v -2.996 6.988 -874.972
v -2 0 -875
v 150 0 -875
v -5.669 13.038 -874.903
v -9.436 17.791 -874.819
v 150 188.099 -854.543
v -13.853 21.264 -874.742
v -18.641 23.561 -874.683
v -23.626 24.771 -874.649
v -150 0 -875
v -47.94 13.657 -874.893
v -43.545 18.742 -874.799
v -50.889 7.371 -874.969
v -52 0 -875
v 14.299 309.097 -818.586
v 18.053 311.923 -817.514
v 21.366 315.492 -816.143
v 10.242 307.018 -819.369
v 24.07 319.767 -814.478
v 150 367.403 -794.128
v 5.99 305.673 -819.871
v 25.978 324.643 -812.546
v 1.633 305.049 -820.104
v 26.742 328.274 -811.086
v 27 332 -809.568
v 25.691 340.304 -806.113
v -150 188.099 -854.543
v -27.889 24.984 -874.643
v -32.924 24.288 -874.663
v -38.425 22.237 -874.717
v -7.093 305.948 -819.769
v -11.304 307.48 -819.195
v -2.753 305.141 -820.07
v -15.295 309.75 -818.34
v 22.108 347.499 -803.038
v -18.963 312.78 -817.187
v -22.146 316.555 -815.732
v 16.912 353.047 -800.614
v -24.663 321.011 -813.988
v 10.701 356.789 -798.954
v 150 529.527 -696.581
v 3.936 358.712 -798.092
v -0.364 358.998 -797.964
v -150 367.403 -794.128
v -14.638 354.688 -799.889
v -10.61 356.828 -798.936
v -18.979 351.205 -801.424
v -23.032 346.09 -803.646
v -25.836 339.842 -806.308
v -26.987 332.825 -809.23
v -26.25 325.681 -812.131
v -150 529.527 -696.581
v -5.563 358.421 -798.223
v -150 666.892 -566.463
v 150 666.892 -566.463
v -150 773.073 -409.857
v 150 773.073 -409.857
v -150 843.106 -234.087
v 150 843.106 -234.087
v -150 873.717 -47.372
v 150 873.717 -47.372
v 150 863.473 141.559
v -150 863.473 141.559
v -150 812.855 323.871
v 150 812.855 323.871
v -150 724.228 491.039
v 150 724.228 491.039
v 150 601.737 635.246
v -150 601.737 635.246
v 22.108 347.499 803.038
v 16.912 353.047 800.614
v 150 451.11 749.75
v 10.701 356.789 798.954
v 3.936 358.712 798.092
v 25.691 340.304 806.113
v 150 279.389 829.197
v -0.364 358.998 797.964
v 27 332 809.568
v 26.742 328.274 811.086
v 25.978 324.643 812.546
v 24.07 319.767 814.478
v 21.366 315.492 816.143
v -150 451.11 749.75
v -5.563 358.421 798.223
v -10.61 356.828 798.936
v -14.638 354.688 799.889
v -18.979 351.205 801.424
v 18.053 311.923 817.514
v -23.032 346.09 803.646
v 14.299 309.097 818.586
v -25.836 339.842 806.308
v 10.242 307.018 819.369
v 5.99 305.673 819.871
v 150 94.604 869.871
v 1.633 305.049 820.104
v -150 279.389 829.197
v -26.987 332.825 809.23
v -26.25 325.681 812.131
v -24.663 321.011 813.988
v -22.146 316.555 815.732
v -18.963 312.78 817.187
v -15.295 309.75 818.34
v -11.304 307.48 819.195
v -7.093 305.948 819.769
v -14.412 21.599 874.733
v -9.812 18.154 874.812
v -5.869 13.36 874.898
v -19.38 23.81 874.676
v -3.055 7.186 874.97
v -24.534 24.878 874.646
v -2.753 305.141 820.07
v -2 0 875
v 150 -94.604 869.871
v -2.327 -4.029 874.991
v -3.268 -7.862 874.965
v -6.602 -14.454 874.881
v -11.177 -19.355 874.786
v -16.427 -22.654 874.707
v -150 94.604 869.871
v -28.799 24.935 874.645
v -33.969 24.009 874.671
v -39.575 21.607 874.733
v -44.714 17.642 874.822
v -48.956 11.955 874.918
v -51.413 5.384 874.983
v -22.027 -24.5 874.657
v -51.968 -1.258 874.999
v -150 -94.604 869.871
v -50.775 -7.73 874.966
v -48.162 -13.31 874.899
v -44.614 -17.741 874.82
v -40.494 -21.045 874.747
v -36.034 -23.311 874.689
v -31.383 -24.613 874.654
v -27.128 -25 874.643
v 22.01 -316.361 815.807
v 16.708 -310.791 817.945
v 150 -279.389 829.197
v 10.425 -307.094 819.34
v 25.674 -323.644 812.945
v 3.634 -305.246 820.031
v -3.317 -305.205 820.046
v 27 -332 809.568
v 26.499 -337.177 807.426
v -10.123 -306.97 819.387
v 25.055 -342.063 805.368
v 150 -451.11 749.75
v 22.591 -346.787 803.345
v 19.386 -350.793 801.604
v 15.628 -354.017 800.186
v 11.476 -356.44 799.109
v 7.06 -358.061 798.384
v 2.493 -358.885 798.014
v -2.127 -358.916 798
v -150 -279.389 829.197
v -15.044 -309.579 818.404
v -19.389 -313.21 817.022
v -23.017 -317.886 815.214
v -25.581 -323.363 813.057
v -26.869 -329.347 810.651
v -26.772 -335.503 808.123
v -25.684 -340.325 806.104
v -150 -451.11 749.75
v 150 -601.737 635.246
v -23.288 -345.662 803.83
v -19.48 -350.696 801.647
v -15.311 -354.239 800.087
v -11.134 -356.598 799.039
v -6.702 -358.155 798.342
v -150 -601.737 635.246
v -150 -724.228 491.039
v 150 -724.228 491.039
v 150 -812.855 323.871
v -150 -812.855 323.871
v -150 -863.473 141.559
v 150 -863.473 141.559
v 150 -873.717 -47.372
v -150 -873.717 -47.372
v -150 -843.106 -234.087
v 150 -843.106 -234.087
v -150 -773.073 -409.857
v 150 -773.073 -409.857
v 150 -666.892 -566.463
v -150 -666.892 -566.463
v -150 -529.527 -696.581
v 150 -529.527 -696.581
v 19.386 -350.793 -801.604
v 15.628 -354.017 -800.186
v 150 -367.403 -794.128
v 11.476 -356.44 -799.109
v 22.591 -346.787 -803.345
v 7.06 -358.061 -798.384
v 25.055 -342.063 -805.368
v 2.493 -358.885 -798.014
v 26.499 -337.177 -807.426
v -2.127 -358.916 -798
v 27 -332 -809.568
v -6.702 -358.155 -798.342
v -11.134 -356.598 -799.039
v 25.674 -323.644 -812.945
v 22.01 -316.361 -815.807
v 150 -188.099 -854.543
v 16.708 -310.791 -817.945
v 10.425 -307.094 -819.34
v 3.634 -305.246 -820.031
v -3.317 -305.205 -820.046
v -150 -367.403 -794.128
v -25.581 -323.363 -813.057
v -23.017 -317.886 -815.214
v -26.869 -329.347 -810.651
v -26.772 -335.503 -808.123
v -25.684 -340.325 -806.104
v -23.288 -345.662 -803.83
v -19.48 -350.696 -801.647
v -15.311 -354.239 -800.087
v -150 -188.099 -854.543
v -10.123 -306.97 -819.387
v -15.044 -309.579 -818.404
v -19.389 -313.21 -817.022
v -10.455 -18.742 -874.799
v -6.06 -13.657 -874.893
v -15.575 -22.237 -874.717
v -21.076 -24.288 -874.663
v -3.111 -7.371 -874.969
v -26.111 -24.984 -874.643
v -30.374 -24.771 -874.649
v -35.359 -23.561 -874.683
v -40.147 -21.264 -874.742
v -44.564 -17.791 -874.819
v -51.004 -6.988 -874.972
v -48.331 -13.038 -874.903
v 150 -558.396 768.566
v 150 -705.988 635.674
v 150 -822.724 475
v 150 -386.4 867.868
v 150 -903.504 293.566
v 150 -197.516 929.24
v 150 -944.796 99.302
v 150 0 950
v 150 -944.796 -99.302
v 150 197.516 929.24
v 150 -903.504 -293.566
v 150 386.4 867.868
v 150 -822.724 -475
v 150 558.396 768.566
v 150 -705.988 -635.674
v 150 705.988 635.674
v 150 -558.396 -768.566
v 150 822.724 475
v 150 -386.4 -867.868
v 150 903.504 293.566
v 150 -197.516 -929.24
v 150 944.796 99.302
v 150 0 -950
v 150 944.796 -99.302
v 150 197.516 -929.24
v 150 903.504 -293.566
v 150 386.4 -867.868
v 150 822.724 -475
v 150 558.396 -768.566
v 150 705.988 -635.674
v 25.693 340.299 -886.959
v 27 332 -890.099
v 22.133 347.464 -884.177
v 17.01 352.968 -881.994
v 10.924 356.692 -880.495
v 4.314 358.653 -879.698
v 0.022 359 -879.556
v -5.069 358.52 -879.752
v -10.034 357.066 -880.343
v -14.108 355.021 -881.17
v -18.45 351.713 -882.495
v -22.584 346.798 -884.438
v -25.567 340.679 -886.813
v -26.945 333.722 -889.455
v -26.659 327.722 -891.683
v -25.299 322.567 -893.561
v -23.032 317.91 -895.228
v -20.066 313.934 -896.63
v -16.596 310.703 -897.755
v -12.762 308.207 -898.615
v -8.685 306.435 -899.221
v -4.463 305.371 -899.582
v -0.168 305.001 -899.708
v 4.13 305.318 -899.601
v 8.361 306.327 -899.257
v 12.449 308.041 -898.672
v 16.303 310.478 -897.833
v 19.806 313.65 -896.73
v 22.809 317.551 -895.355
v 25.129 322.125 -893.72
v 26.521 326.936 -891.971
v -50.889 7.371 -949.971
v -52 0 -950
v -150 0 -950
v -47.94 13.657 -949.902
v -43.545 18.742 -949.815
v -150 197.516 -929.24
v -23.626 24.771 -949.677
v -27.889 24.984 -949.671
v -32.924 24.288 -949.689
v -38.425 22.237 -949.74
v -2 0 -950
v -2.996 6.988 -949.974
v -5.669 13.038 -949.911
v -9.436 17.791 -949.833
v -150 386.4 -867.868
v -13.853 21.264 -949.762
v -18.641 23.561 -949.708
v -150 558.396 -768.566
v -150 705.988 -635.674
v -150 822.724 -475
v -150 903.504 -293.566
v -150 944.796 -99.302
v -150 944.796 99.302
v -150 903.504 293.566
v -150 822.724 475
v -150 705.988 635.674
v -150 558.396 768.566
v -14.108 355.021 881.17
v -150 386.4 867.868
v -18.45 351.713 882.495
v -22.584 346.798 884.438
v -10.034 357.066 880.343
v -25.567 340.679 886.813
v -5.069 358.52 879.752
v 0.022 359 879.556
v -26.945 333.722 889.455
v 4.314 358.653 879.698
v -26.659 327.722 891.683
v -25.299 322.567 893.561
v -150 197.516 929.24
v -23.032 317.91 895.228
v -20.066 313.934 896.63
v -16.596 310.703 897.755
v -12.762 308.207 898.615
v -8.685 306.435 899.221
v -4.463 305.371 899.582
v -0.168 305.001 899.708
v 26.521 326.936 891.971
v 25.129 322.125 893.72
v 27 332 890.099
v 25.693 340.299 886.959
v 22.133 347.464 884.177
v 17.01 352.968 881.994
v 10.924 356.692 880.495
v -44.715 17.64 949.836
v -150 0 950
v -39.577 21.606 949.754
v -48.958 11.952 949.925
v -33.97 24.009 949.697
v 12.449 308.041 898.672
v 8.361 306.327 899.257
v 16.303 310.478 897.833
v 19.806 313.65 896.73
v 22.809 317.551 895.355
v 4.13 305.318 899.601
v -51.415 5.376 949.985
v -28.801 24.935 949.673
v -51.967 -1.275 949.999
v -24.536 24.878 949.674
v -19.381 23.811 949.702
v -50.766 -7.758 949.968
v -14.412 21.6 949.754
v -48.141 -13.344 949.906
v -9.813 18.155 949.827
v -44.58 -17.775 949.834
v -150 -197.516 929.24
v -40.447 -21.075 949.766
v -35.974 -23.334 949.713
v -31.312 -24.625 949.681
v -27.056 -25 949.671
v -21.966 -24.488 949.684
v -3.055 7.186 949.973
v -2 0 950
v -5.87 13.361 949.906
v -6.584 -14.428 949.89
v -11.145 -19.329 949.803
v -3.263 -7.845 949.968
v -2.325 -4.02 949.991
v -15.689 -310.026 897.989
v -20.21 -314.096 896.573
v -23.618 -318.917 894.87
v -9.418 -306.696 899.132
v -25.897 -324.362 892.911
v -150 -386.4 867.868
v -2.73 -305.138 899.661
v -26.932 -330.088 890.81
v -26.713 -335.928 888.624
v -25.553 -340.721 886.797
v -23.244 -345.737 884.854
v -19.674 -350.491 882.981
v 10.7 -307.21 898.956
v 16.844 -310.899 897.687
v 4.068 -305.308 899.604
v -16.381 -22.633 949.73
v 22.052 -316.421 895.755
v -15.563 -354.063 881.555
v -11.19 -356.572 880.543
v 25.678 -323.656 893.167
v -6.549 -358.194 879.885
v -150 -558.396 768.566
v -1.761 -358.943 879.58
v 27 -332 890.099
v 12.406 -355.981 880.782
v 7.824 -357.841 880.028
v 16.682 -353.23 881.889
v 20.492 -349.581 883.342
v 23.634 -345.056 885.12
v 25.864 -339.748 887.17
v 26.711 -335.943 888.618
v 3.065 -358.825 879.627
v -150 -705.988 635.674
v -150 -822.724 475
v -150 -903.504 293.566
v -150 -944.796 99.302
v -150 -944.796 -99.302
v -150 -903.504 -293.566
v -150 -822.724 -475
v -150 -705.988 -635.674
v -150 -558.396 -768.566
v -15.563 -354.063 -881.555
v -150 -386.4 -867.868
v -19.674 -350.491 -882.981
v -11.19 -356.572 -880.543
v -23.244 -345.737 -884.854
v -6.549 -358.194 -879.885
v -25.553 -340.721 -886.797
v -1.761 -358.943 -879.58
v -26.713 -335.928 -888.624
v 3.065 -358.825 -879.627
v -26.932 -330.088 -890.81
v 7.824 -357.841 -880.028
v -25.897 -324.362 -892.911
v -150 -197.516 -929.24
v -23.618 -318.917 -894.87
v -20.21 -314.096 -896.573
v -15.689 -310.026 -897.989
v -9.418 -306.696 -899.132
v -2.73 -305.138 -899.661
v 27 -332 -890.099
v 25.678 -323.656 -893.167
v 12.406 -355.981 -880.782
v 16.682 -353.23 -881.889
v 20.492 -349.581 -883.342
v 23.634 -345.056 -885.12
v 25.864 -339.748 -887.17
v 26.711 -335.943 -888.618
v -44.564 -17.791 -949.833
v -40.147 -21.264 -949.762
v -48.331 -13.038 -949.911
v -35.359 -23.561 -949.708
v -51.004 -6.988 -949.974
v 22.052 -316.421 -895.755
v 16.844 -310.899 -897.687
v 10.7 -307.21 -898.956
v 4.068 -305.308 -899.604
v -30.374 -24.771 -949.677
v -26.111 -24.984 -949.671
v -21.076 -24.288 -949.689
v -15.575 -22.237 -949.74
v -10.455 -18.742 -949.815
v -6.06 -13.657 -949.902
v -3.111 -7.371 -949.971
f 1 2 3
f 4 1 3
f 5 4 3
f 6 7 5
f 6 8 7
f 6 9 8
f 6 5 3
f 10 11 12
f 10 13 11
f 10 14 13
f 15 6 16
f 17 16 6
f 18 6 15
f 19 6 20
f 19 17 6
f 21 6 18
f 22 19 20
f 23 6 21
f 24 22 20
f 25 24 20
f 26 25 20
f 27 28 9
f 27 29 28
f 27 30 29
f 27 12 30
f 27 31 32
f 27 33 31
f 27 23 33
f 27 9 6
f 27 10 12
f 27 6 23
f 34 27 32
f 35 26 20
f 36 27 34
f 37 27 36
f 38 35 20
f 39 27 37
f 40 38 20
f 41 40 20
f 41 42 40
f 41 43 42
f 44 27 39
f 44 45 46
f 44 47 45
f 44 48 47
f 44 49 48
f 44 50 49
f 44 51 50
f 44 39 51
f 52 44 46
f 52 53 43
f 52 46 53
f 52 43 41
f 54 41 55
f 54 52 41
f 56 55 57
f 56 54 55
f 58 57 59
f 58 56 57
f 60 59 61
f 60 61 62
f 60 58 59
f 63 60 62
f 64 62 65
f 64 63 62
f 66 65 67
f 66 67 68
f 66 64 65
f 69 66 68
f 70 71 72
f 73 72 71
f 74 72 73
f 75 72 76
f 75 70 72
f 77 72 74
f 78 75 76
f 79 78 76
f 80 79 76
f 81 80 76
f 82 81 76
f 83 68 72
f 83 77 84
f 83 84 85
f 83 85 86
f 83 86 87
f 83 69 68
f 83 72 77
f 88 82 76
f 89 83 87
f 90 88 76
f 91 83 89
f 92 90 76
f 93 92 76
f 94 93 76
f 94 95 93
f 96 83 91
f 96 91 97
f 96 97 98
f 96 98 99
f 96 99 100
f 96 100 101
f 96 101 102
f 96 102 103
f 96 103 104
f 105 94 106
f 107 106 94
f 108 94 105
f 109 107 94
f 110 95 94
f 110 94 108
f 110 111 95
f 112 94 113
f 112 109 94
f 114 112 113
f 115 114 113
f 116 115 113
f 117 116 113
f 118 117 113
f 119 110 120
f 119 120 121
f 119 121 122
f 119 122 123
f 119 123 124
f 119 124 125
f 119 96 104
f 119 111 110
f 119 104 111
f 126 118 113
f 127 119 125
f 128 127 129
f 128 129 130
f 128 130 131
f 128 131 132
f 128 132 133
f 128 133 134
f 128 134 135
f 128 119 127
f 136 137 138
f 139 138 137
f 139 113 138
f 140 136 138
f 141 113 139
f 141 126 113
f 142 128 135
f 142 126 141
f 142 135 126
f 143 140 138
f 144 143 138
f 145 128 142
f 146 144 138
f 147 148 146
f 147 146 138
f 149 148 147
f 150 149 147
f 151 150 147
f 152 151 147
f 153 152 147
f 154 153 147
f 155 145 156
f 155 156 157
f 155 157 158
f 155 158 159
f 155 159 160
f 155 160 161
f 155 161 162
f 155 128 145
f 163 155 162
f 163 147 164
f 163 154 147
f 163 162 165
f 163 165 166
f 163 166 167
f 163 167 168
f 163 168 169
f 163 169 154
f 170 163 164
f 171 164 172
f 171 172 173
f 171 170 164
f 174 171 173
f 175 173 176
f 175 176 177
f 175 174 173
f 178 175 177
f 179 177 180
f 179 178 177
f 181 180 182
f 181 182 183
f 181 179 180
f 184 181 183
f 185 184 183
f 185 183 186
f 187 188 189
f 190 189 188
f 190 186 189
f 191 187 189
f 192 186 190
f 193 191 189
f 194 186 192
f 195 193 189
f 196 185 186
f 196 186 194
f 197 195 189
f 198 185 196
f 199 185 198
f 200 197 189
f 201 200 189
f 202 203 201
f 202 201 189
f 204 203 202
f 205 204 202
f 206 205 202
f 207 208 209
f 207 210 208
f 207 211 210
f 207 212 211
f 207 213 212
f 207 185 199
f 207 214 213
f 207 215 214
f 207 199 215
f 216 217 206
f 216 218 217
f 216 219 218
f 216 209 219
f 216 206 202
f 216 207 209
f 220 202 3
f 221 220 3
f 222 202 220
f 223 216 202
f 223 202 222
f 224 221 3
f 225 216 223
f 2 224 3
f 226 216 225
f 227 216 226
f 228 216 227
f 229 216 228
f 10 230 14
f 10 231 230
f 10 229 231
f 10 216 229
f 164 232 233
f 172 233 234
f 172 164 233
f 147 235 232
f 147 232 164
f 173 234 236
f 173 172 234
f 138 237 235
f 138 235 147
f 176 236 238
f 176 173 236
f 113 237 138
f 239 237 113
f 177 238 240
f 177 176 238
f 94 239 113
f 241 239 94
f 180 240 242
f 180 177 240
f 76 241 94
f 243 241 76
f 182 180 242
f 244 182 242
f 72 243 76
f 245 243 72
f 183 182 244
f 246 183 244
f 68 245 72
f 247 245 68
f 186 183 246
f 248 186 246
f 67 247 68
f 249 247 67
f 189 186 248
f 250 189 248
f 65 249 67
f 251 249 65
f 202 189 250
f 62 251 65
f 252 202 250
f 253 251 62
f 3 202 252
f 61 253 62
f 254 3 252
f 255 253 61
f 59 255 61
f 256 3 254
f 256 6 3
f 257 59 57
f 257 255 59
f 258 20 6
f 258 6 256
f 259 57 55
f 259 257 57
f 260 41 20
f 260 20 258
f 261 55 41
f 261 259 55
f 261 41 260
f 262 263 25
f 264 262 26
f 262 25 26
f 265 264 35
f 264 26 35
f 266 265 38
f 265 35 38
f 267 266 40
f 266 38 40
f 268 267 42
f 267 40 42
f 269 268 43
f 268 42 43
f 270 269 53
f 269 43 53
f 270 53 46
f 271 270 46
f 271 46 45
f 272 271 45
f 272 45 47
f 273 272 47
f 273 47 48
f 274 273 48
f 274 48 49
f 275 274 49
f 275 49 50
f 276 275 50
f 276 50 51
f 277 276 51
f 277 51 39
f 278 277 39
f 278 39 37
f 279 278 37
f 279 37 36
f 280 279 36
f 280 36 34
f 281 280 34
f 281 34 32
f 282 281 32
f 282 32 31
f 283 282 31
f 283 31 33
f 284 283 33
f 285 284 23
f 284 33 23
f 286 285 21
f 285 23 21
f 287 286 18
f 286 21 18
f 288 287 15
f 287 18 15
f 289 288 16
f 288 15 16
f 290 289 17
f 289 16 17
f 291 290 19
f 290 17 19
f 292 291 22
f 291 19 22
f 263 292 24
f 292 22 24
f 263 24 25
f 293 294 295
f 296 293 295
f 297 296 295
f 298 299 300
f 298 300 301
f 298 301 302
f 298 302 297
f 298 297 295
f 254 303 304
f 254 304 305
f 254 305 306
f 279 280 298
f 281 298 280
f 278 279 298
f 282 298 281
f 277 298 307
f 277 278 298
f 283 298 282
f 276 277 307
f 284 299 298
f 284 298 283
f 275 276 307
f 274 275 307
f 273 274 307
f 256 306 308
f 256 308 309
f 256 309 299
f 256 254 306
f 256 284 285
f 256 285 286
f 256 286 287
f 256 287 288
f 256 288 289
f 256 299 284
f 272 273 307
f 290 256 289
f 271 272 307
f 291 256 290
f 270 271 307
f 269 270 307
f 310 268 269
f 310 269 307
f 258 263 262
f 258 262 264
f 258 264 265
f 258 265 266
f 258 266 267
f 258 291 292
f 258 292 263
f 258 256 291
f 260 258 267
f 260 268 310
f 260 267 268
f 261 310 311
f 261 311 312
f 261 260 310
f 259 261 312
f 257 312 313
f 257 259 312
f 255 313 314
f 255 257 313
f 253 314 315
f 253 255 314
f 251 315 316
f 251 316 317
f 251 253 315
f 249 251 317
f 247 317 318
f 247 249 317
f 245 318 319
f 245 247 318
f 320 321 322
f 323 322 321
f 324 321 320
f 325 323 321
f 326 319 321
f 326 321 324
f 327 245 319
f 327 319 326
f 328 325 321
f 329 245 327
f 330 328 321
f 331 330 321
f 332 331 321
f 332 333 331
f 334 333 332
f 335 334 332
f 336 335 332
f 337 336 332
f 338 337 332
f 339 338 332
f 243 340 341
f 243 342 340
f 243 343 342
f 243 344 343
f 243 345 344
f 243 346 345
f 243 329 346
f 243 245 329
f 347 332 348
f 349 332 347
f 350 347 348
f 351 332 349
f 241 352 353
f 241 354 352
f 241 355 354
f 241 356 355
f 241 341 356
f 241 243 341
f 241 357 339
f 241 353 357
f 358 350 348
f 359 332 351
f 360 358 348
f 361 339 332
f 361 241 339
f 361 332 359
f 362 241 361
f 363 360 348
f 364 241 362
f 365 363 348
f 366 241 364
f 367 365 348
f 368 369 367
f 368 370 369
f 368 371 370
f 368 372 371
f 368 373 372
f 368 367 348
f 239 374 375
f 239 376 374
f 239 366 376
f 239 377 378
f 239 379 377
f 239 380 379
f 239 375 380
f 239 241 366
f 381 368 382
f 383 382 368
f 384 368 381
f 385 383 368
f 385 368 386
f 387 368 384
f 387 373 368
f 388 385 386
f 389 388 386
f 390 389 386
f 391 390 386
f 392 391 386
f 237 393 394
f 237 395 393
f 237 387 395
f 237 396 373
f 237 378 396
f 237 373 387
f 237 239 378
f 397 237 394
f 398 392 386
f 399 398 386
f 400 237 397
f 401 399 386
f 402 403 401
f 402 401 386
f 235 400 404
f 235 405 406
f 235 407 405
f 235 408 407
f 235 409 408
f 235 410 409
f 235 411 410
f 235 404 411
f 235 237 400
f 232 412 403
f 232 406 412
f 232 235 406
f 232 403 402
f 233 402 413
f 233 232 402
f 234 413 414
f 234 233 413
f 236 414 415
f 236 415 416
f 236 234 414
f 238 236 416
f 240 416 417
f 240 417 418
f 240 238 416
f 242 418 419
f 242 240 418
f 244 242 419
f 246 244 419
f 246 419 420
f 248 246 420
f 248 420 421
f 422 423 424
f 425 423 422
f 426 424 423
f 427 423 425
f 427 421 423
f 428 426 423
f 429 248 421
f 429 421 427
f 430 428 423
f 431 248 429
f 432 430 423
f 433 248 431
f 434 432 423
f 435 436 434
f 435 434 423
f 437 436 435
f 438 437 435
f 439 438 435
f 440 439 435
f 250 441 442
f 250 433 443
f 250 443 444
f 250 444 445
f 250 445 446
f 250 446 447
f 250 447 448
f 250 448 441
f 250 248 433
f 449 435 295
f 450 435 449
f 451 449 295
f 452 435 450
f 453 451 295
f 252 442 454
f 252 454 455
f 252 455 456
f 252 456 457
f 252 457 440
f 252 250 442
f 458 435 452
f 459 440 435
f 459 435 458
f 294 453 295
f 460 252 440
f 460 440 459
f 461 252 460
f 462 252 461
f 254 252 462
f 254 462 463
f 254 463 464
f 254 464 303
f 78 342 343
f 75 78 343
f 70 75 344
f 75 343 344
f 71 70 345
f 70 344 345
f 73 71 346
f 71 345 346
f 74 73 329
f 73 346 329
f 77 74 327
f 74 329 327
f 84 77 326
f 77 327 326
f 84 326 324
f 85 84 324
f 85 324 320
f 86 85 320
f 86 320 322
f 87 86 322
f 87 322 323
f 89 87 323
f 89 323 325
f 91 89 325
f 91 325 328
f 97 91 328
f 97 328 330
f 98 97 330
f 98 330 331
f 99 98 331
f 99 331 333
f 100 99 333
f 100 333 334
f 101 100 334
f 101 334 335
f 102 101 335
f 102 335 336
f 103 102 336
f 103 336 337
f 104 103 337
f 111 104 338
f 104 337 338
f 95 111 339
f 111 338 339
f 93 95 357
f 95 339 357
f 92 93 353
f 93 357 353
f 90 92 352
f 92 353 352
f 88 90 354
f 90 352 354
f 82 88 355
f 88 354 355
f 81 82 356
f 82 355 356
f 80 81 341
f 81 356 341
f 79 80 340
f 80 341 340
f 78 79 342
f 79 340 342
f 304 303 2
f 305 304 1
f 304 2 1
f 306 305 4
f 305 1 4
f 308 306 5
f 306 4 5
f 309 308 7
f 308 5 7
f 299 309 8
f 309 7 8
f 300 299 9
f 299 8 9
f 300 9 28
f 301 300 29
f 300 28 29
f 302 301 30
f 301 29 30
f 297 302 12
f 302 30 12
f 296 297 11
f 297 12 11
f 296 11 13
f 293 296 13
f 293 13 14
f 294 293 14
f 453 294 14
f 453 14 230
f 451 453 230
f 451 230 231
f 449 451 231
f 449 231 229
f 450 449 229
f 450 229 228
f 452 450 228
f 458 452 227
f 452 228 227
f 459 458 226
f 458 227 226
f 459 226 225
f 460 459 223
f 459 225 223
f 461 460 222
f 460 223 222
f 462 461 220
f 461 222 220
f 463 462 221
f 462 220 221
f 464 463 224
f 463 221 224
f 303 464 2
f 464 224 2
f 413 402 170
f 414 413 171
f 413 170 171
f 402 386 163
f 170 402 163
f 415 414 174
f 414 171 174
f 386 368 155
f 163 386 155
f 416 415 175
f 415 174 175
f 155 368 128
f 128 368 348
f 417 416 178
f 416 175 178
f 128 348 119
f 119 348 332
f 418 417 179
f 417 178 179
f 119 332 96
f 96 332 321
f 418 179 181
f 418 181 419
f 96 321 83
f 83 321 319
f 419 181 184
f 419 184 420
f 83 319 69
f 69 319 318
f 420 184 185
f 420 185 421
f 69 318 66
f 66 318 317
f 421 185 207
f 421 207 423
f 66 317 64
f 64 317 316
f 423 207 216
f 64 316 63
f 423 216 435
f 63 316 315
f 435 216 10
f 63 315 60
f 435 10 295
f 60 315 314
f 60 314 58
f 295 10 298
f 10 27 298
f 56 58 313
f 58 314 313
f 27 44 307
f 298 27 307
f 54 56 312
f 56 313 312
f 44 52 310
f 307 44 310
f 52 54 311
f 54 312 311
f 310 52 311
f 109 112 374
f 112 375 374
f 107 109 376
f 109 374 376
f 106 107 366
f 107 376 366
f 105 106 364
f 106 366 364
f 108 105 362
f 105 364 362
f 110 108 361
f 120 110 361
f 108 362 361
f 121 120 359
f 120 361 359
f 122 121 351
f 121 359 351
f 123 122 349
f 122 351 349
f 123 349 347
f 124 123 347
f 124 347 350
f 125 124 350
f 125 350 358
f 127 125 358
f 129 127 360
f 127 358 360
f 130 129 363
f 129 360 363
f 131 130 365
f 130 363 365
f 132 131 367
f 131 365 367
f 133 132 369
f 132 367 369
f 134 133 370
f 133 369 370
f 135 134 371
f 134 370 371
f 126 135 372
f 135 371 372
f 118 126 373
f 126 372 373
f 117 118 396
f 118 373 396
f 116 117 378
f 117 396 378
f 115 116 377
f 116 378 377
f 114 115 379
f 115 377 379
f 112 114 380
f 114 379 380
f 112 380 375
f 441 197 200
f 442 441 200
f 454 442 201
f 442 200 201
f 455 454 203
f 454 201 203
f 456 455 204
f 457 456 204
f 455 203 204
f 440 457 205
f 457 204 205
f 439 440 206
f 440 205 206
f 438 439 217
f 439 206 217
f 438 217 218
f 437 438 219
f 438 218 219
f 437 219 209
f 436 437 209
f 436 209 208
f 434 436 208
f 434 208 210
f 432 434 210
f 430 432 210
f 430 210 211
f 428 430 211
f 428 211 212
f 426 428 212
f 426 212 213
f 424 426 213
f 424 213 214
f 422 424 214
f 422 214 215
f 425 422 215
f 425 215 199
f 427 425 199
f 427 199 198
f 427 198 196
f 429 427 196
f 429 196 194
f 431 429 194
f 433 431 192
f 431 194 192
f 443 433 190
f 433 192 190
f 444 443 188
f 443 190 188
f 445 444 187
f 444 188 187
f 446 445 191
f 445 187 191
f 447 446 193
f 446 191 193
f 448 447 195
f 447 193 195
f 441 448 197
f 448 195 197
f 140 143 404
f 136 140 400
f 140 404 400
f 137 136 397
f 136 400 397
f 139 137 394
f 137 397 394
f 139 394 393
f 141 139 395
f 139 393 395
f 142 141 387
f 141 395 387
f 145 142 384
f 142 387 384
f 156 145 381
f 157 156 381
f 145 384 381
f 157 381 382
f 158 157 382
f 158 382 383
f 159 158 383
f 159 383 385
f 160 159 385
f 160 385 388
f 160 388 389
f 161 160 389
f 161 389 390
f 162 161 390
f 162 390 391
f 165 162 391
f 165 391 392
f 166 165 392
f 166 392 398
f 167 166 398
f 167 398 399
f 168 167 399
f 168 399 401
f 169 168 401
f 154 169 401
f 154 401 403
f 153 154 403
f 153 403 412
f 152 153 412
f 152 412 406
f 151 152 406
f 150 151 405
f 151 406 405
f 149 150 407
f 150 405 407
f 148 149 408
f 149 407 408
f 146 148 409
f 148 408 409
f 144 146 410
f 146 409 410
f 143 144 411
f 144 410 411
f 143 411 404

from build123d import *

# Parameters (mm, degrees)
SKETCH1_R           = 950
SKETCH1_R_2         = 875
BOSS_EXTRUDE1_DEPTH = 150
SKETCH2_R           = 25
SKETCH2_R_2         = 27
CUT_EXTRUDE1_DEPTH  = 2318.037764043


with BuildPart() as part:
    # Sketch1 → Boss-Extrude1 (new, symmetric)
    with BuildSketch(Plane(origin=(0, 0, 0), x_dir=(0, 0, -1), z_dir=(1, 0, 0))):
        Circle(SKETCH1_R)
        Circle(SKETCH1_R_2, mode=Mode.SUBTRACT)
    extrude(amount=BOSS_EXTRUDE1_DEPTH, both=True)

    # Sketch2 → Cut-Extrude1 (cut, through all)
    with BuildSketch(Plane.XY.offset(1158)):
        with Locations((-27, 0)):
            Circle(SKETCH2_R)
        with Locations((0, 332)):
            Circle(SKETCH2_R_2)
        with Locations((0, -332)):
            Circle(SKETCH2_R_2)
    extrude(amount=-CUT_EXTRUDE1_DEPTH, mode=Mode.SUBTRACT)


solid = part.part
